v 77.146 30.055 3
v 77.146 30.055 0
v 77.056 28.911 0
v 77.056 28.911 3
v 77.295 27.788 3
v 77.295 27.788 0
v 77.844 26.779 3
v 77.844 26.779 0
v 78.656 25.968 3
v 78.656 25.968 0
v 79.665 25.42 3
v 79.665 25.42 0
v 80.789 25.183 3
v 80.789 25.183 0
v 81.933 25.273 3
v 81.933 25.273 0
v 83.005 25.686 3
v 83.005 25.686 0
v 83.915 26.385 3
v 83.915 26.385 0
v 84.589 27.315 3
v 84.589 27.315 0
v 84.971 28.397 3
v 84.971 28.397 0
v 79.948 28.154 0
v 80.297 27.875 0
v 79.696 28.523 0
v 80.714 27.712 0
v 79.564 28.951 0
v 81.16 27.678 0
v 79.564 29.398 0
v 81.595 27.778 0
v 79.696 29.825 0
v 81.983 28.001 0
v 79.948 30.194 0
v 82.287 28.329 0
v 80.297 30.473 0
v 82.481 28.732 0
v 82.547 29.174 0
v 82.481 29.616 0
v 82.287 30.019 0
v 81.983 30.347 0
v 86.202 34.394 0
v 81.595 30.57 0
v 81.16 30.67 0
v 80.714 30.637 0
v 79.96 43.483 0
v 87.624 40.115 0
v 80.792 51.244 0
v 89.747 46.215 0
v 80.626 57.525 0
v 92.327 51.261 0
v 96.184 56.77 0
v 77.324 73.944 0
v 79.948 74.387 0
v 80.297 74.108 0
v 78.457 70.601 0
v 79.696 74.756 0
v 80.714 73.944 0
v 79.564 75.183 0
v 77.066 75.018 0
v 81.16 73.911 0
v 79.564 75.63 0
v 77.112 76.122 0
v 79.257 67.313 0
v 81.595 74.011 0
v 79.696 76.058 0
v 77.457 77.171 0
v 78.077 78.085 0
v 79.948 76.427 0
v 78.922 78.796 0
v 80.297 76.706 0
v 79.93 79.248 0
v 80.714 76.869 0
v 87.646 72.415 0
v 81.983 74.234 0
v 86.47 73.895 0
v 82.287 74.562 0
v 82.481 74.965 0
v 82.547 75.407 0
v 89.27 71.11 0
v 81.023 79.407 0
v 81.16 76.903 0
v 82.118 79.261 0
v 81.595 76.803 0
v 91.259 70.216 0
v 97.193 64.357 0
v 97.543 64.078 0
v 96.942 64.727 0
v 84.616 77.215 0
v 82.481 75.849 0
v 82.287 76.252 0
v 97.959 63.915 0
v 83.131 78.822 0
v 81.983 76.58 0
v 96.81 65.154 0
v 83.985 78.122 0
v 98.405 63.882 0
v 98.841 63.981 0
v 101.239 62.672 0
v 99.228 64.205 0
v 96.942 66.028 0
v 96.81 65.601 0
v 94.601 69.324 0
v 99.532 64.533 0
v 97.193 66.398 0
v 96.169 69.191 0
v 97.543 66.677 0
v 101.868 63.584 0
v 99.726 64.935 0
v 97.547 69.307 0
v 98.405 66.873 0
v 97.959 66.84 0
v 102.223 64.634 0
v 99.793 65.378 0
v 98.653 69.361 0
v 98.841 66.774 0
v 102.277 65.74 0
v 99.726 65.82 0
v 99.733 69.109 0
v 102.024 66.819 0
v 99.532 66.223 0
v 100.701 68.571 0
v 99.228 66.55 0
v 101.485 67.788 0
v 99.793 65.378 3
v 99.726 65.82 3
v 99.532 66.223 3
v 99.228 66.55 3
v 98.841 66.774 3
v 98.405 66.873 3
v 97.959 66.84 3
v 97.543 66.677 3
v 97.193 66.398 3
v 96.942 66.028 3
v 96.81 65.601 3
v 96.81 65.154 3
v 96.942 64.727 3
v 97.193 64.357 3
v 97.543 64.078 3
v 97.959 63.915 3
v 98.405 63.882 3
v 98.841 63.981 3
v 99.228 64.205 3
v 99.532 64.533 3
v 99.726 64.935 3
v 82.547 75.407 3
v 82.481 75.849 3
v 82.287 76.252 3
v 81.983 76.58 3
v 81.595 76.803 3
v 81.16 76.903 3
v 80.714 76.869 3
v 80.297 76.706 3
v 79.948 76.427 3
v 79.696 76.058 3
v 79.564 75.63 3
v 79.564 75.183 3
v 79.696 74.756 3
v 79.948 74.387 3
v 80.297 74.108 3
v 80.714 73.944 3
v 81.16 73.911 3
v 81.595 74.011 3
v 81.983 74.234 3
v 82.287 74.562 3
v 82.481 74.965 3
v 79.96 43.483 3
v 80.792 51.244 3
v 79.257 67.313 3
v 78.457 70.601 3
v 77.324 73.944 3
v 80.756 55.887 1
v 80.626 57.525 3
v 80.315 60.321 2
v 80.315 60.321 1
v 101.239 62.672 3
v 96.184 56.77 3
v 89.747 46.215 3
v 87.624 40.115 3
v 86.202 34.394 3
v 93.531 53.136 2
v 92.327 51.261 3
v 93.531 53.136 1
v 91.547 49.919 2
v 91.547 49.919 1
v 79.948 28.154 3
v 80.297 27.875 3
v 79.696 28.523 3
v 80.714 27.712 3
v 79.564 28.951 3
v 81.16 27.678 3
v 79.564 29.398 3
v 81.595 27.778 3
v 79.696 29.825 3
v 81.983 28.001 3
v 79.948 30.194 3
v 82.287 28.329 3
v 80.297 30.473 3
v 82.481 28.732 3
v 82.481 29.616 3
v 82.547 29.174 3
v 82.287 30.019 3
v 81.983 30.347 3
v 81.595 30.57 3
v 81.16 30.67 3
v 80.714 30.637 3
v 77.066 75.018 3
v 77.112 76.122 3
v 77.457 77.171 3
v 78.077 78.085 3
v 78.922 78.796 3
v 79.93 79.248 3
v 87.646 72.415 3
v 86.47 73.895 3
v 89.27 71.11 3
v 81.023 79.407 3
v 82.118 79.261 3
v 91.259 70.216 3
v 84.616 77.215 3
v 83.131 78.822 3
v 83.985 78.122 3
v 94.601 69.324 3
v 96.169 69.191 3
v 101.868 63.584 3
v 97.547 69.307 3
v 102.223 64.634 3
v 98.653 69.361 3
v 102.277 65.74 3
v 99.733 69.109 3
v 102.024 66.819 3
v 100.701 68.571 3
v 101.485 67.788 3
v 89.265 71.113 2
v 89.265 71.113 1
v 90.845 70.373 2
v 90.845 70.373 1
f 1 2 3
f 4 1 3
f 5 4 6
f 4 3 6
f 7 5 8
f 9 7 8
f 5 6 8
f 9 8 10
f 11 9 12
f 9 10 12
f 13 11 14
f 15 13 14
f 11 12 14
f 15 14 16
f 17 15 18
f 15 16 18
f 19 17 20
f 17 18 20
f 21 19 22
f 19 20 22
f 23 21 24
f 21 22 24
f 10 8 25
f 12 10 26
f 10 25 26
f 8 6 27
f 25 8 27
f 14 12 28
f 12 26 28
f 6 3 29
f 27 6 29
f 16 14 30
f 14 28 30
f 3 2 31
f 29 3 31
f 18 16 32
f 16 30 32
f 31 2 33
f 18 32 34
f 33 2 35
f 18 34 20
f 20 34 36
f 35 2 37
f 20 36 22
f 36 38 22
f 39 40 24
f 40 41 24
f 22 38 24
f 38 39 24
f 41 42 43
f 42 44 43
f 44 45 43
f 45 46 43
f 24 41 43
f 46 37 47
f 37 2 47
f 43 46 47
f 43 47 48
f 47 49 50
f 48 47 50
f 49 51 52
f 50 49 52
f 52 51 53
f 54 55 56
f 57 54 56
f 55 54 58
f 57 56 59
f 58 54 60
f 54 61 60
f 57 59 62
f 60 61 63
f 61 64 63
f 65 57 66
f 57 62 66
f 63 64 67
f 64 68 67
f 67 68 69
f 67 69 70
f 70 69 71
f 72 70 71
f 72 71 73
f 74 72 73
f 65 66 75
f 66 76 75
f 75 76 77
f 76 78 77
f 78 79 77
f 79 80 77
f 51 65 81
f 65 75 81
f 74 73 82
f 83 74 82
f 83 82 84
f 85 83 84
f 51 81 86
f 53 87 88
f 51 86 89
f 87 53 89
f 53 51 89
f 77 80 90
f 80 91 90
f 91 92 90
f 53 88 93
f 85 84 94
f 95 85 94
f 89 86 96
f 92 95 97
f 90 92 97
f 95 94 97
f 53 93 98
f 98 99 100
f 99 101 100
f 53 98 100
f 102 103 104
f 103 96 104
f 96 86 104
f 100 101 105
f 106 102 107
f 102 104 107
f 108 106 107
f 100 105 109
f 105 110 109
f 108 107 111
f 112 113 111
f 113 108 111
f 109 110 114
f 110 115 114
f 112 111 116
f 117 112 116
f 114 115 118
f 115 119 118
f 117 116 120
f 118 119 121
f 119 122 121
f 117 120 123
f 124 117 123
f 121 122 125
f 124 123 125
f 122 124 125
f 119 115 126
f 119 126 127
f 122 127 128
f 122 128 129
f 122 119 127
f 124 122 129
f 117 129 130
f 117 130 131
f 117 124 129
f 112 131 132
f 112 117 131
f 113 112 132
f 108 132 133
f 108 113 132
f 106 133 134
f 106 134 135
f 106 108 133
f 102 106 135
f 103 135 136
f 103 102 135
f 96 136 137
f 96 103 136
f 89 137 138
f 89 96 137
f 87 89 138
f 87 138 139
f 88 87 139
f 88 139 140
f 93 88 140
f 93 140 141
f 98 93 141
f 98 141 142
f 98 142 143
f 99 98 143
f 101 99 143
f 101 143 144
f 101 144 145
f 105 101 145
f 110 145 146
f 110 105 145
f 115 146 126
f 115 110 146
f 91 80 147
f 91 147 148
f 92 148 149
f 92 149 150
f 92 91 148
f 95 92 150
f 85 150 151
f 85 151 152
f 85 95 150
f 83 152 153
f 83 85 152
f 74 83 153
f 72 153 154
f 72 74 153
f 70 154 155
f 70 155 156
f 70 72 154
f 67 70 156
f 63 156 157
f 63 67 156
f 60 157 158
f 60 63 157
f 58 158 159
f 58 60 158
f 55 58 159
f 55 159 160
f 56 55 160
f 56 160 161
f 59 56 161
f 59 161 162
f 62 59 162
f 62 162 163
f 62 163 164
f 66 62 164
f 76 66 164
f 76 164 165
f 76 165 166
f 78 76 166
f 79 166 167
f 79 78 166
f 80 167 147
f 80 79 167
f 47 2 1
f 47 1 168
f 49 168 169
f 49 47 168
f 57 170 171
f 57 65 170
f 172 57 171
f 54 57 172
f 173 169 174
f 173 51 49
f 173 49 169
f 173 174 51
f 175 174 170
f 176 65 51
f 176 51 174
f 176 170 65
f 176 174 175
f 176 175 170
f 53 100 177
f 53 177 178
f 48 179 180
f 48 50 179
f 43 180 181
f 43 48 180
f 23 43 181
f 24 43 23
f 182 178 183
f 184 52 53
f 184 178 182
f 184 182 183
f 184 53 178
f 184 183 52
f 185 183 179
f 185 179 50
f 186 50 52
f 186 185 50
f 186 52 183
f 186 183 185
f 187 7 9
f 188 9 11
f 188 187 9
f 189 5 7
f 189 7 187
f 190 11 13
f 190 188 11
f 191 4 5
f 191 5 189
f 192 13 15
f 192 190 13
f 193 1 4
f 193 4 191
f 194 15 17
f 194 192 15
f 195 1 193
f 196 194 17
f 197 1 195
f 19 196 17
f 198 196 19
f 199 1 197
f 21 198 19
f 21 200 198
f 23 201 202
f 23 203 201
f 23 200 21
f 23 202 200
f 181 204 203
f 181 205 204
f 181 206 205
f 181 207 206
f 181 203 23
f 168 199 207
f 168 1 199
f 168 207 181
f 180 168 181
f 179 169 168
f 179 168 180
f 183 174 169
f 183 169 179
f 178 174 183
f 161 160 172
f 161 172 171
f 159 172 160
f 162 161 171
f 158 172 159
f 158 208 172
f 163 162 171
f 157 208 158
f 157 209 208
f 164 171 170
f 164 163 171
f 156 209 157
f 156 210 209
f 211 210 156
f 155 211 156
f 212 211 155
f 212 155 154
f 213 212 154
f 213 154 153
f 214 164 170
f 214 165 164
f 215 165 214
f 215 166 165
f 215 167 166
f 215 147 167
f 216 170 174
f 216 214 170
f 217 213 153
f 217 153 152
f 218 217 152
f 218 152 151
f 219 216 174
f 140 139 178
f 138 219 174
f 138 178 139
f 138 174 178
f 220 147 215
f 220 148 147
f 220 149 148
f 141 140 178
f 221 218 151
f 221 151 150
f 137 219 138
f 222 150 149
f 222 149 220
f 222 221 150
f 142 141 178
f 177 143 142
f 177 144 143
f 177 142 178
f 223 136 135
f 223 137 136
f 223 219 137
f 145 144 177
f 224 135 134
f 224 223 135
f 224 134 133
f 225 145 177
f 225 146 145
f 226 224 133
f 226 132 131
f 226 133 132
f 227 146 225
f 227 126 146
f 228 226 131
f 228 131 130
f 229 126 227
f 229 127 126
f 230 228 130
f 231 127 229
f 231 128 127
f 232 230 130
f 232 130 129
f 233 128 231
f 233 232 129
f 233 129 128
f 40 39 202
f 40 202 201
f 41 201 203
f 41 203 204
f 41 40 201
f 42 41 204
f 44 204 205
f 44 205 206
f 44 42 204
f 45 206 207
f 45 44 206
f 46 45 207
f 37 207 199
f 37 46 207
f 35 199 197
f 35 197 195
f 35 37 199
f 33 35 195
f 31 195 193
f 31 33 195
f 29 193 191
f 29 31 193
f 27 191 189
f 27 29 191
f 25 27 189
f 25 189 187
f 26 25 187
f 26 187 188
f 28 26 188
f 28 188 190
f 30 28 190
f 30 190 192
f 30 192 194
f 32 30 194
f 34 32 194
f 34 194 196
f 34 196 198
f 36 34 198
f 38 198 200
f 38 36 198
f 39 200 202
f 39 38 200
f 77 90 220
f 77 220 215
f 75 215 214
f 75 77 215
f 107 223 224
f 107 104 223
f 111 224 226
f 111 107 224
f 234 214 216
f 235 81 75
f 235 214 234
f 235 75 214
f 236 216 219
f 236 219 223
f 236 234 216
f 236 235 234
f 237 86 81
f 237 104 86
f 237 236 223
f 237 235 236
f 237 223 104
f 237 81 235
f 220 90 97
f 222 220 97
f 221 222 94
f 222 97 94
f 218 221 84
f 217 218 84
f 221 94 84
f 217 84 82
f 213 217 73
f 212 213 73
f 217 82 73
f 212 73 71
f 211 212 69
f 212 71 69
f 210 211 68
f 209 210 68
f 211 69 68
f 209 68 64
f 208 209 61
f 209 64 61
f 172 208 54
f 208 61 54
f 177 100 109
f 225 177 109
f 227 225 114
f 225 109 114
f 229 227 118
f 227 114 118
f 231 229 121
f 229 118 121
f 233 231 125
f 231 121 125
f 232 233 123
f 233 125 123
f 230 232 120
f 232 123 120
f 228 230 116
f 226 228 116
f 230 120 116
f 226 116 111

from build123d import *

# Parameters (mm, degrees)
ESQUISSE15_R        = 1.5
BOSS_EXTRU_15_DEPTH = 3


with BuildPart() as part:
    # Esquisse15 → Boss.-Extru.15 (new body)
    with BuildSketch(Plane.XY):
        with BuildLine():
            ThreePointArc((84.615566757, 77.214807715), (79.410356581, 79.056476896), (77.32447165, 73.944232535))
            add(Edge.make_bspline(
                [(77.145713615, 30.055195656), (79.080308516, 38.622687362), (81.66327099, 48.786134392), (79.931018502, 63.688726471), (79.143562251, 69.313820095), (77.32447165, 73.944232535)],
                knots=[0, 0, 0, 0, 0.576573495, 0.676573495, 1, 1, 1, 1], degree=3))
            ThreePointArc((77.145713615, 30.055195656), (80.218465063, 25.261002777), (84.971318589, 28.39731752))
            add(Edge.make_bspline(
                [(101.238857322, 62.671617625), (98.376312092, 59.555241307), (94.899619815, 55.416000824), (88.227335604, 44.717523156), (86.528624586, 36.263368643), (84.971318589, 28.39731752)],
                knots=[0, 0, 0, 0, 0.311641153, 0.411641153, 1, 1, 1, 1], degree=3))
            ThreePointArc((101.238857322, 62.671617625), (101.788339756, 67.322427703), (97.546599361, 69.307271211))
            add(Edge.make_bspline(
                [(84.615566757, 77.214807715), (85.76555462, 74.945262877), (87.284529762, 71.896675961), (92.709580096, 69.538935669), (95.692727353, 68.955151445), (97.546599361, 69.307271211)],
                knots=[0, 0, 0, 0, 0.456100215, 0.556100215, 1, 1, 1, 1], degree=3))
        make_face()
        with Locations((81.047477623, 75.406842025)):
            Circle(ESQUISSE15_R, mode=Mode.SUBTRACT)
        with Locations((98.293004791, 65.377528352)):
            Circle(ESQUISSE15_R, mode=Mode.SUBTRACT)
        with Locations((81.047477623, 29.17415217)):
            Circle(ESQUISSE15_R, mode=Mode.SUBTRACT)
    extrude(amount=BOSS_EXTRU_15_DEPTH)


solid = part.part
